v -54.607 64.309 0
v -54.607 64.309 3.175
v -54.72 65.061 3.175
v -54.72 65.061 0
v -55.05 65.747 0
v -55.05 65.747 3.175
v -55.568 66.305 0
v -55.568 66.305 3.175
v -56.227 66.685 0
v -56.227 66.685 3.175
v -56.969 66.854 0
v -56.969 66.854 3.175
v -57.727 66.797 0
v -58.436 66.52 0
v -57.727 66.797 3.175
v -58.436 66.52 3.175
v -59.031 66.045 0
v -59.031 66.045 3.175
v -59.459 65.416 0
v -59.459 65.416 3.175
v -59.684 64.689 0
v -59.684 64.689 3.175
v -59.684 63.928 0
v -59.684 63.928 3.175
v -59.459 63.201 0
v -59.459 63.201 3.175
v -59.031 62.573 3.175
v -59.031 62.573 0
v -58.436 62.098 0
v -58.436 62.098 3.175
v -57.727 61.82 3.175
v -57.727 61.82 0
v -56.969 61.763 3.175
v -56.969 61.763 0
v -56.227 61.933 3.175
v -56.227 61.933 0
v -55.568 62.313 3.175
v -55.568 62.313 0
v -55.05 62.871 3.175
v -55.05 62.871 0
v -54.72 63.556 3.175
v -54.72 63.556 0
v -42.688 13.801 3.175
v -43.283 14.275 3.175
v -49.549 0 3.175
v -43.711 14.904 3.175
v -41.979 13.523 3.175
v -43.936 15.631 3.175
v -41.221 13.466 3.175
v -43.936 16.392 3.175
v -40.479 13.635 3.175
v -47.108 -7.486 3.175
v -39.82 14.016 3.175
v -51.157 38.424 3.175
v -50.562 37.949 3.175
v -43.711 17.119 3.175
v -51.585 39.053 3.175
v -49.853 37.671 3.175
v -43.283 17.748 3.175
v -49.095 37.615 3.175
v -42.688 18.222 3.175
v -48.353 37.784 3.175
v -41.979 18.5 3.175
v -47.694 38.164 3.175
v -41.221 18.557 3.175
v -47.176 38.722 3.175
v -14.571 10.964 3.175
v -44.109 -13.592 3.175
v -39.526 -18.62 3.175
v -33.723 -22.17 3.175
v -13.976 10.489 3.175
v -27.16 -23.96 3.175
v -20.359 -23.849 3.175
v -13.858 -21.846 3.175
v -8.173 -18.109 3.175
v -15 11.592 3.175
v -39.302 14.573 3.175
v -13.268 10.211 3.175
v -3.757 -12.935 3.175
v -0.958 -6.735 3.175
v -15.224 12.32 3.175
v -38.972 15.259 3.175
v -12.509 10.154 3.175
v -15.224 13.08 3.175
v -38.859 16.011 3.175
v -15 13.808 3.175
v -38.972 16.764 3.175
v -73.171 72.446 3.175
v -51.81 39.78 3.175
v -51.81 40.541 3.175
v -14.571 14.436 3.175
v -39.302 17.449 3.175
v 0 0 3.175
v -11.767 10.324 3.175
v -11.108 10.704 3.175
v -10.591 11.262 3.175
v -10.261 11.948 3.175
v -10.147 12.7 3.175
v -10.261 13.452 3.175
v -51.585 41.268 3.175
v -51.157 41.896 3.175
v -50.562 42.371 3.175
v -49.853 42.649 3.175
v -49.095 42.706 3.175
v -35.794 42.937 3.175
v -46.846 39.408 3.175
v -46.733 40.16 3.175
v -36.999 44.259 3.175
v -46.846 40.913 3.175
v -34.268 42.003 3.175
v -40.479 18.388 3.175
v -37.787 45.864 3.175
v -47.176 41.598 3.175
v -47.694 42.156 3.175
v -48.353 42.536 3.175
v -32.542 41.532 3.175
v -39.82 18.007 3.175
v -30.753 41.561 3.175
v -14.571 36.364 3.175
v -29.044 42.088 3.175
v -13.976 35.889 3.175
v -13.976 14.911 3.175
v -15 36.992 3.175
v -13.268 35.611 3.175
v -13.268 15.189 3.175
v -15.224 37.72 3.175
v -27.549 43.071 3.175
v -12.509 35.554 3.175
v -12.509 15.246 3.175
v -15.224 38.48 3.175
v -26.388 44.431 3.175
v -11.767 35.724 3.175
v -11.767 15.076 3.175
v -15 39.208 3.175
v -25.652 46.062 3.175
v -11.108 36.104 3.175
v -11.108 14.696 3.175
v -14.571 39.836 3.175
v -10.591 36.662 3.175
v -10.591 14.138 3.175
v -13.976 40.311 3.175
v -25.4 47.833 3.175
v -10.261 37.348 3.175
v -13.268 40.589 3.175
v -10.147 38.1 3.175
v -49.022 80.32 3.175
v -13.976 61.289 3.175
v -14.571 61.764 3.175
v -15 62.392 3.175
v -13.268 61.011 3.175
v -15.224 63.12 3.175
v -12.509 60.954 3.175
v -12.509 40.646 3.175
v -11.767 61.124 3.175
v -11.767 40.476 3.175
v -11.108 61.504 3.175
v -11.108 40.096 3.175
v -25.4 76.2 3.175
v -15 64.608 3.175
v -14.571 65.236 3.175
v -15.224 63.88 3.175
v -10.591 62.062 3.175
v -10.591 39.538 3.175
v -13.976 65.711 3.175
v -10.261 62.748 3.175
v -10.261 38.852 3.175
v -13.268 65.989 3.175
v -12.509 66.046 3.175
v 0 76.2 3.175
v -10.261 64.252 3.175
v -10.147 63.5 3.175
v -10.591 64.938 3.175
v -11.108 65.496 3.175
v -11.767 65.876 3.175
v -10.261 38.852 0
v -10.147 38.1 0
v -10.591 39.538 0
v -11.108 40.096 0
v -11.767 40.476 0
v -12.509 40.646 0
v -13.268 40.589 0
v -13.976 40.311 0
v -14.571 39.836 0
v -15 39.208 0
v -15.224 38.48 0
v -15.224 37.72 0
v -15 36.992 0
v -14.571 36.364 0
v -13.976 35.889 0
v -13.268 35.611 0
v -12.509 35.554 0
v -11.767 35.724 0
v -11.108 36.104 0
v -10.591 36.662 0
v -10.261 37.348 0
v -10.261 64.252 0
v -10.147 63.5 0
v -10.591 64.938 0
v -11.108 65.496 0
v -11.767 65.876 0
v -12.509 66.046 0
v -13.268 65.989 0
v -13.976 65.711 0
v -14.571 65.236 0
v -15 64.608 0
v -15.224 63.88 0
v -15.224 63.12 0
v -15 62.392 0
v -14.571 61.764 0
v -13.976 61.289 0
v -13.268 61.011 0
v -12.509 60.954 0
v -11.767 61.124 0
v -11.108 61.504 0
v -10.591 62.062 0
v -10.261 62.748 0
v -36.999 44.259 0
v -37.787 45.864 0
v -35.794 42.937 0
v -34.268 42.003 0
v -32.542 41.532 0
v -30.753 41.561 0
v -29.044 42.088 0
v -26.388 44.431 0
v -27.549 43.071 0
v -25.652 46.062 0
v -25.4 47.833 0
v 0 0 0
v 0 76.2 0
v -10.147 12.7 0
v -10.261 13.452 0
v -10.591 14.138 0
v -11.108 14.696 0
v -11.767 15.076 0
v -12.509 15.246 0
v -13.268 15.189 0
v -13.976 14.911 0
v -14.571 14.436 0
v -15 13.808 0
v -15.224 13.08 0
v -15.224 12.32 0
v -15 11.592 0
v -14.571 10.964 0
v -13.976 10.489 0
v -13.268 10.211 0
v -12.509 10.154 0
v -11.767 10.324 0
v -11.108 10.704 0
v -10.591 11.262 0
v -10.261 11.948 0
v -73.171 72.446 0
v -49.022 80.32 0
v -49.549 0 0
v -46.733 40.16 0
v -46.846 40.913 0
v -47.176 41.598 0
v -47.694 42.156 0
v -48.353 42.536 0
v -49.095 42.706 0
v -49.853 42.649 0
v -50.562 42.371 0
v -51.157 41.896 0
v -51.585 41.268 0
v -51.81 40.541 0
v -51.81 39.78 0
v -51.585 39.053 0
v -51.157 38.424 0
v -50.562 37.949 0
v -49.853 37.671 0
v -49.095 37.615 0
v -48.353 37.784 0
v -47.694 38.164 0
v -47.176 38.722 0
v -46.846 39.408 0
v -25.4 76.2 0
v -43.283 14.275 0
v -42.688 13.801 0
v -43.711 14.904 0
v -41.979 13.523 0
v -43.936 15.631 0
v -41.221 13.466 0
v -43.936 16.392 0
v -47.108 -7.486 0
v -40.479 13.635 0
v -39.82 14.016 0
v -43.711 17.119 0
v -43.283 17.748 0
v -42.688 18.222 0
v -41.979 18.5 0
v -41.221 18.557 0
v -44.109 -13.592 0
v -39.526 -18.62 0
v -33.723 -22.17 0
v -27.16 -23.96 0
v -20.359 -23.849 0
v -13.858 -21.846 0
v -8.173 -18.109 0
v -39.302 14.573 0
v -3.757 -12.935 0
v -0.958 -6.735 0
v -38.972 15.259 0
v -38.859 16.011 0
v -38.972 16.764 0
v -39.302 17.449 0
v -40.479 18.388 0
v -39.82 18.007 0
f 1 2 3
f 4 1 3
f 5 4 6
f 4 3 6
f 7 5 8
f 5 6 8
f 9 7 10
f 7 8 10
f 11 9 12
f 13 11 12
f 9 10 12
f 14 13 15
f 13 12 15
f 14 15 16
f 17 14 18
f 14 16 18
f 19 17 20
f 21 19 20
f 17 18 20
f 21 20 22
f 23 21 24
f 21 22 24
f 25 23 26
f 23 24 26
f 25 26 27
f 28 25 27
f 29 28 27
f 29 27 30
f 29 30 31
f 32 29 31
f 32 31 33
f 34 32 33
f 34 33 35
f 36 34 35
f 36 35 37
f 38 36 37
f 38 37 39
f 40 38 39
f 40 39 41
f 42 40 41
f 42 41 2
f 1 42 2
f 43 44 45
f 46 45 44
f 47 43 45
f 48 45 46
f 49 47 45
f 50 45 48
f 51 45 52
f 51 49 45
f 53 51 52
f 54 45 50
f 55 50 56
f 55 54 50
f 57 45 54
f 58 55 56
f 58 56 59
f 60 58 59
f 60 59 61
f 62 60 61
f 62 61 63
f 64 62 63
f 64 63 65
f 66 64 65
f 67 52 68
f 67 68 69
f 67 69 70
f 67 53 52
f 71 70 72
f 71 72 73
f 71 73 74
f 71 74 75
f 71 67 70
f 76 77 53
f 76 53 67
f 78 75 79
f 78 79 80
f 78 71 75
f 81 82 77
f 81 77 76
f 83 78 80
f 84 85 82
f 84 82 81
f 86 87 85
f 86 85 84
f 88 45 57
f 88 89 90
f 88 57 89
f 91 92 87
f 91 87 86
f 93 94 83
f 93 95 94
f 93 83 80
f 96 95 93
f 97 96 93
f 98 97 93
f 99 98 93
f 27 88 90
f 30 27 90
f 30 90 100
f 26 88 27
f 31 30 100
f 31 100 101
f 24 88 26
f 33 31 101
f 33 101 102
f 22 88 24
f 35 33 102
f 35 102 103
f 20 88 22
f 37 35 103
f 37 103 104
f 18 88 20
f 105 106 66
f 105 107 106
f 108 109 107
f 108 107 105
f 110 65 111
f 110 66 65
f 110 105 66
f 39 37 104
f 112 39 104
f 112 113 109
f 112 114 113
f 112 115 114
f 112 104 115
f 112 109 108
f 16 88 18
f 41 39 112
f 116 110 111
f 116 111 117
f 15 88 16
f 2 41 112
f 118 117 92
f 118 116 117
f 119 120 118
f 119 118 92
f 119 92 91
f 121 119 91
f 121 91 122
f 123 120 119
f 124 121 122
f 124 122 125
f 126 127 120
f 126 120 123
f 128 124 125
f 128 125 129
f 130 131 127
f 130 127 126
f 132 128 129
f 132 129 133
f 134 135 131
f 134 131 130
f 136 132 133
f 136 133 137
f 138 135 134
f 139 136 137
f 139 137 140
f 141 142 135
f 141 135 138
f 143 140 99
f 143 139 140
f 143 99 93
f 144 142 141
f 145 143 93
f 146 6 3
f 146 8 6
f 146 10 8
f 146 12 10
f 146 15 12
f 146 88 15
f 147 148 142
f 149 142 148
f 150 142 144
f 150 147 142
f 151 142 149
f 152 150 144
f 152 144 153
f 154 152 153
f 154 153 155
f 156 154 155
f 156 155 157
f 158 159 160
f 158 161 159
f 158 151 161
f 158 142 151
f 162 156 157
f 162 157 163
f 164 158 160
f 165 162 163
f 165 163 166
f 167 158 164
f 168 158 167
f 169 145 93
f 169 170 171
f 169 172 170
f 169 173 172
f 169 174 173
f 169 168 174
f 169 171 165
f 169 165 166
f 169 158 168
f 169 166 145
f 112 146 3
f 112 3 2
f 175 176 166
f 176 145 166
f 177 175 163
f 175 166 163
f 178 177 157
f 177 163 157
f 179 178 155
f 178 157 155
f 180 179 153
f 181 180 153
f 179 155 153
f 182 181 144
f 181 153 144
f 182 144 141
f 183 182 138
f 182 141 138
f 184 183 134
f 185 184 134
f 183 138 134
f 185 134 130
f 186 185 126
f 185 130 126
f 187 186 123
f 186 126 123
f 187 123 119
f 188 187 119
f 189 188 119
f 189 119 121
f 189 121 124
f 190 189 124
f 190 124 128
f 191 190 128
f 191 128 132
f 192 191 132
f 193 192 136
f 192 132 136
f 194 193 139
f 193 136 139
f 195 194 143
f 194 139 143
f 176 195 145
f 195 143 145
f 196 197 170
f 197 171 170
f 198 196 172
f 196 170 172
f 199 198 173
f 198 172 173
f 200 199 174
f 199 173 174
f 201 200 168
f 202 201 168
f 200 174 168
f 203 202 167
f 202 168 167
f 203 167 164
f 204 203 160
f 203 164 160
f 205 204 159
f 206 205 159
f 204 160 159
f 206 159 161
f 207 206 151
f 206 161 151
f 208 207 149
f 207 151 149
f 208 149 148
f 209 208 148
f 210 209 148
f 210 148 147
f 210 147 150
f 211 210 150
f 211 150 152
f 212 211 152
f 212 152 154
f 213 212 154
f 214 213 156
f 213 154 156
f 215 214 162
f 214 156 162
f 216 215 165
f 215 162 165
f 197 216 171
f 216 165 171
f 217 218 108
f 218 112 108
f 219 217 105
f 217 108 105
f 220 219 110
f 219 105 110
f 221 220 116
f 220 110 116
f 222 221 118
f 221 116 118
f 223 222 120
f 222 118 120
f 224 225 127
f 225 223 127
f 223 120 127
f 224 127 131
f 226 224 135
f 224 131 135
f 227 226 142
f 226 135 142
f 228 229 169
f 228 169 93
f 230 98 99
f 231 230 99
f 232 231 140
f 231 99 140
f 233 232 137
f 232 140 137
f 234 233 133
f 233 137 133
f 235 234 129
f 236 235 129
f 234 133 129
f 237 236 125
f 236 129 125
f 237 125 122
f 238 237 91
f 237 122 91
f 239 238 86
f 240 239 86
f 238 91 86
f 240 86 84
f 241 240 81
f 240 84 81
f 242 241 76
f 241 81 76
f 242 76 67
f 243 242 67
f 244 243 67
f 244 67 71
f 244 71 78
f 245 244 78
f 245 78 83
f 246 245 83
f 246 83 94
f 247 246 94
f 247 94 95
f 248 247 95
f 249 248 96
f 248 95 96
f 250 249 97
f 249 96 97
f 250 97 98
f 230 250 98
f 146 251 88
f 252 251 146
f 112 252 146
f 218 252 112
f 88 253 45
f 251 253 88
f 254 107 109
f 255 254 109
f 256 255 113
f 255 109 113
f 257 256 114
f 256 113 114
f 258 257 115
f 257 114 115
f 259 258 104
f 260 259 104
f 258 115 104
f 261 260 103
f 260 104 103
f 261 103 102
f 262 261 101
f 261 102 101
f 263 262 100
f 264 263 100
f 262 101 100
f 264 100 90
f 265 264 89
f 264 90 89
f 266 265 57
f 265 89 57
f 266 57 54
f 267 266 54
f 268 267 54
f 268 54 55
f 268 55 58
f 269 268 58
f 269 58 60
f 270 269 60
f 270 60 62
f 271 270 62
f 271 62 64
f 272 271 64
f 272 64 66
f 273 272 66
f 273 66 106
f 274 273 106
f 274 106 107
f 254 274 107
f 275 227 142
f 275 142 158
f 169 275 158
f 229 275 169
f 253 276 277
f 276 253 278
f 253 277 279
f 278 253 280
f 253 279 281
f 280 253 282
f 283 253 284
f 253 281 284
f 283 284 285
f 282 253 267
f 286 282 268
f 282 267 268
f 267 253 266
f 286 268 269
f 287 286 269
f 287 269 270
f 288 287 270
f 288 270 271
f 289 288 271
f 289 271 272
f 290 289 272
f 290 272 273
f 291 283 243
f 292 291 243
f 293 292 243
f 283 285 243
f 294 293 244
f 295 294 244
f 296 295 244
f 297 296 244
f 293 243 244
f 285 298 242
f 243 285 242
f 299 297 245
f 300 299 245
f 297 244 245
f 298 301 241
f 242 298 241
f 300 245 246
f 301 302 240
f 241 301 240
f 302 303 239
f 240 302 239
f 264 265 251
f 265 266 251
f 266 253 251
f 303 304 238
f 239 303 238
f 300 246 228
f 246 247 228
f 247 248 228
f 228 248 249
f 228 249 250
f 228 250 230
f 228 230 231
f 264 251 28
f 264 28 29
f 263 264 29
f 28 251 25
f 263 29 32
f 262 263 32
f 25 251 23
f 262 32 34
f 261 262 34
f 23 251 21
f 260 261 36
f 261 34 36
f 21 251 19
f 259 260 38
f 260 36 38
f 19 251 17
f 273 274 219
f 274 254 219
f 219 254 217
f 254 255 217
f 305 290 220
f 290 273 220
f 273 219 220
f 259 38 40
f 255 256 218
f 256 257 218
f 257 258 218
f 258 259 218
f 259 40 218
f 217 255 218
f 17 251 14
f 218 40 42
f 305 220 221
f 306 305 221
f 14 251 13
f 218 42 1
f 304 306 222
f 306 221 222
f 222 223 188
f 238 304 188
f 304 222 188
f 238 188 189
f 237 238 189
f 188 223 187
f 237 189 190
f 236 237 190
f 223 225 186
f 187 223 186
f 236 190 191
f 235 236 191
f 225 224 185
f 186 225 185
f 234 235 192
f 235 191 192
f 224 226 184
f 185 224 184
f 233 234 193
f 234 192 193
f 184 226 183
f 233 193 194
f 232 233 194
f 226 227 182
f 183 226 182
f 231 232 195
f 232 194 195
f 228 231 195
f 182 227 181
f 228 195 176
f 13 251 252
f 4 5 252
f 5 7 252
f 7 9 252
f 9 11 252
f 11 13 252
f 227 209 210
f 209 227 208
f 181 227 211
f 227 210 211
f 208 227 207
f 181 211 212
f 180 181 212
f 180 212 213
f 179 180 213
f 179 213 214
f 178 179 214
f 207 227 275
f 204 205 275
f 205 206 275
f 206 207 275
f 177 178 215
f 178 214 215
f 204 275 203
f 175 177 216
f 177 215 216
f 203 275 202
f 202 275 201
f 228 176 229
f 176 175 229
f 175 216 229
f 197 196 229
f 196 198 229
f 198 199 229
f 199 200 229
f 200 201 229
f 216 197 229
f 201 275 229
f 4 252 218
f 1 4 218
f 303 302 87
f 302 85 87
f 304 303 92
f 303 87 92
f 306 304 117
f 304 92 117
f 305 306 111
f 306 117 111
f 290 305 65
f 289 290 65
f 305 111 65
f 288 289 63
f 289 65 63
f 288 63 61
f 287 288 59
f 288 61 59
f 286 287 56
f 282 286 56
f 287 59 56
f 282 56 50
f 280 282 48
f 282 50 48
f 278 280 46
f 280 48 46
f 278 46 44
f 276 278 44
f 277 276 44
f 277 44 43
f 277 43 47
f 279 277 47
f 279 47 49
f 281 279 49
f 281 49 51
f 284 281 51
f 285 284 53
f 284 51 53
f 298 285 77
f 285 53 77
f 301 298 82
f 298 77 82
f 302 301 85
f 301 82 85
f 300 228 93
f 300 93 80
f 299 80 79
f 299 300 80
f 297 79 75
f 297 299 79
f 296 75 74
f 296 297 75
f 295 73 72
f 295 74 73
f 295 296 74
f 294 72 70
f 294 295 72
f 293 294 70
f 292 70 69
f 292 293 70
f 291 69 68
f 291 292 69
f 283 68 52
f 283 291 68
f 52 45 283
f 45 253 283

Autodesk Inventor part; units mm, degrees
ref_plane "YZ Plane" through (0, 0, 0) normal (1, 0, 0) x (0, 1, 0)
ref_plane "XZ Plane" through (0, 0, 0) normal (0, 1, 0) x (-1, 0, 0)
ref_plane "XY Plane" through (0, 0, 0) normal (0, 0, 1) x (1, 0, 0)
sketch "Sketch1" plane through (0, 0, 0) normal (0, 0, 1) x (1, 0, 0)
  line L0 (0, 0) -> (-25.4, 0)
  line L1 (-25.4, 0) -> (-25.4, 76.2)
  line L2 (-25.4, 76.2) -> (0, 76.2)
  line L3 (0, 76.2) -> (0, 0)
  line L4 (-25.4, 7.874) -> (-49.5487, 0)
  line L5 (-49.5487, 0) -> (-73.1707, 72.4461)
  line L6 (-73.1707, 72.4461) -> (-49.022, 80.3201)
  line L7 (-49.022, 80.3201) -> (-25.4, 7.874)
  circle A0 centre (-24.1487, 0) radius 24.1487
  line L8 (-49.5487, 0) -> (-47.1078, -7.4861)
  dimension "d0" = 25.4
  dimension "d1" = 76.2
  dimension "d3" = 25.4
  dimension "d4" = 7.874
  dimension "d5" = 76.2
extrude "Extrusion1" add sketch "Sketch1" along normal blind 3.175 contours A0 L4 L1 L0 | A0 L1 L2 L3 | L0 L1 A0 | L8 L4 A0 | L4 A0 L7 | L4 L5 L6 L7 A0
fillet "Fillet1" radius 6.35 1 edges at (-25.4, 7.874, 1.5875)
sketch "Sketch2" plane through (0, 0, 3.175) normal (0, 0, 1) x (1, 0, 0)
  line L0 (0, 76.2) -> (-25.4, 76.2) projected
  line L1 (-25.4, 76.2) -> (-25.4, 47.8326) projected
  arc A0 (-37.7872, 45.8641) -> (-25.4, 47.8326) centre (-31.75, 47.8326) ccw projected
  line L2 (-37.7872, 45.8641) -> (-49.022, 80.3201) projected
  line L3 (-49.022, 80.3201) -> (-73.1707, 72.4461) projected
  line L4 (-73.1707, 72.4461) -> (-47.1078, -7.4861) projected
  arc A1 (-47.1078, -7.4861) -> (0, 0) centre (-24.1487, 0) ccw projected
  line L5 (0, 0) -> (0, 76.2) projected
  circle A2 centre (-12.7, 63.5) radius 2.5527
  circle A3 centre (-12.7, 38.1) radius 2.5527
  circle A4 centre (-12.7, 12.7) radius 2.5527
  circle A5 centre (-57.1594, 64.3088) radius 2.5527
  circle A6 centre (-49.2854, 40.1601) radius 2.5527
  circle A7 centre (-41.4114, 16.0114) radius 2.5527
  dimension "d9" = 5.1054
  dimension "d10" = 12.7
  dimension "d11" = 12.7
  dimension "d14" = 25.4
  dimension "d19" = 5.1054
  dimension "d20" = 12.7
  dimension "d21" = 12.7
  dimension "d24" = 25.4
extrude "Extrusion2" cut sketch "Sketch2" against normal blind 3.175 contours A2 | A3 | A4 | A5 | A6 | A7
properties part number "Top_angled_gusset"
